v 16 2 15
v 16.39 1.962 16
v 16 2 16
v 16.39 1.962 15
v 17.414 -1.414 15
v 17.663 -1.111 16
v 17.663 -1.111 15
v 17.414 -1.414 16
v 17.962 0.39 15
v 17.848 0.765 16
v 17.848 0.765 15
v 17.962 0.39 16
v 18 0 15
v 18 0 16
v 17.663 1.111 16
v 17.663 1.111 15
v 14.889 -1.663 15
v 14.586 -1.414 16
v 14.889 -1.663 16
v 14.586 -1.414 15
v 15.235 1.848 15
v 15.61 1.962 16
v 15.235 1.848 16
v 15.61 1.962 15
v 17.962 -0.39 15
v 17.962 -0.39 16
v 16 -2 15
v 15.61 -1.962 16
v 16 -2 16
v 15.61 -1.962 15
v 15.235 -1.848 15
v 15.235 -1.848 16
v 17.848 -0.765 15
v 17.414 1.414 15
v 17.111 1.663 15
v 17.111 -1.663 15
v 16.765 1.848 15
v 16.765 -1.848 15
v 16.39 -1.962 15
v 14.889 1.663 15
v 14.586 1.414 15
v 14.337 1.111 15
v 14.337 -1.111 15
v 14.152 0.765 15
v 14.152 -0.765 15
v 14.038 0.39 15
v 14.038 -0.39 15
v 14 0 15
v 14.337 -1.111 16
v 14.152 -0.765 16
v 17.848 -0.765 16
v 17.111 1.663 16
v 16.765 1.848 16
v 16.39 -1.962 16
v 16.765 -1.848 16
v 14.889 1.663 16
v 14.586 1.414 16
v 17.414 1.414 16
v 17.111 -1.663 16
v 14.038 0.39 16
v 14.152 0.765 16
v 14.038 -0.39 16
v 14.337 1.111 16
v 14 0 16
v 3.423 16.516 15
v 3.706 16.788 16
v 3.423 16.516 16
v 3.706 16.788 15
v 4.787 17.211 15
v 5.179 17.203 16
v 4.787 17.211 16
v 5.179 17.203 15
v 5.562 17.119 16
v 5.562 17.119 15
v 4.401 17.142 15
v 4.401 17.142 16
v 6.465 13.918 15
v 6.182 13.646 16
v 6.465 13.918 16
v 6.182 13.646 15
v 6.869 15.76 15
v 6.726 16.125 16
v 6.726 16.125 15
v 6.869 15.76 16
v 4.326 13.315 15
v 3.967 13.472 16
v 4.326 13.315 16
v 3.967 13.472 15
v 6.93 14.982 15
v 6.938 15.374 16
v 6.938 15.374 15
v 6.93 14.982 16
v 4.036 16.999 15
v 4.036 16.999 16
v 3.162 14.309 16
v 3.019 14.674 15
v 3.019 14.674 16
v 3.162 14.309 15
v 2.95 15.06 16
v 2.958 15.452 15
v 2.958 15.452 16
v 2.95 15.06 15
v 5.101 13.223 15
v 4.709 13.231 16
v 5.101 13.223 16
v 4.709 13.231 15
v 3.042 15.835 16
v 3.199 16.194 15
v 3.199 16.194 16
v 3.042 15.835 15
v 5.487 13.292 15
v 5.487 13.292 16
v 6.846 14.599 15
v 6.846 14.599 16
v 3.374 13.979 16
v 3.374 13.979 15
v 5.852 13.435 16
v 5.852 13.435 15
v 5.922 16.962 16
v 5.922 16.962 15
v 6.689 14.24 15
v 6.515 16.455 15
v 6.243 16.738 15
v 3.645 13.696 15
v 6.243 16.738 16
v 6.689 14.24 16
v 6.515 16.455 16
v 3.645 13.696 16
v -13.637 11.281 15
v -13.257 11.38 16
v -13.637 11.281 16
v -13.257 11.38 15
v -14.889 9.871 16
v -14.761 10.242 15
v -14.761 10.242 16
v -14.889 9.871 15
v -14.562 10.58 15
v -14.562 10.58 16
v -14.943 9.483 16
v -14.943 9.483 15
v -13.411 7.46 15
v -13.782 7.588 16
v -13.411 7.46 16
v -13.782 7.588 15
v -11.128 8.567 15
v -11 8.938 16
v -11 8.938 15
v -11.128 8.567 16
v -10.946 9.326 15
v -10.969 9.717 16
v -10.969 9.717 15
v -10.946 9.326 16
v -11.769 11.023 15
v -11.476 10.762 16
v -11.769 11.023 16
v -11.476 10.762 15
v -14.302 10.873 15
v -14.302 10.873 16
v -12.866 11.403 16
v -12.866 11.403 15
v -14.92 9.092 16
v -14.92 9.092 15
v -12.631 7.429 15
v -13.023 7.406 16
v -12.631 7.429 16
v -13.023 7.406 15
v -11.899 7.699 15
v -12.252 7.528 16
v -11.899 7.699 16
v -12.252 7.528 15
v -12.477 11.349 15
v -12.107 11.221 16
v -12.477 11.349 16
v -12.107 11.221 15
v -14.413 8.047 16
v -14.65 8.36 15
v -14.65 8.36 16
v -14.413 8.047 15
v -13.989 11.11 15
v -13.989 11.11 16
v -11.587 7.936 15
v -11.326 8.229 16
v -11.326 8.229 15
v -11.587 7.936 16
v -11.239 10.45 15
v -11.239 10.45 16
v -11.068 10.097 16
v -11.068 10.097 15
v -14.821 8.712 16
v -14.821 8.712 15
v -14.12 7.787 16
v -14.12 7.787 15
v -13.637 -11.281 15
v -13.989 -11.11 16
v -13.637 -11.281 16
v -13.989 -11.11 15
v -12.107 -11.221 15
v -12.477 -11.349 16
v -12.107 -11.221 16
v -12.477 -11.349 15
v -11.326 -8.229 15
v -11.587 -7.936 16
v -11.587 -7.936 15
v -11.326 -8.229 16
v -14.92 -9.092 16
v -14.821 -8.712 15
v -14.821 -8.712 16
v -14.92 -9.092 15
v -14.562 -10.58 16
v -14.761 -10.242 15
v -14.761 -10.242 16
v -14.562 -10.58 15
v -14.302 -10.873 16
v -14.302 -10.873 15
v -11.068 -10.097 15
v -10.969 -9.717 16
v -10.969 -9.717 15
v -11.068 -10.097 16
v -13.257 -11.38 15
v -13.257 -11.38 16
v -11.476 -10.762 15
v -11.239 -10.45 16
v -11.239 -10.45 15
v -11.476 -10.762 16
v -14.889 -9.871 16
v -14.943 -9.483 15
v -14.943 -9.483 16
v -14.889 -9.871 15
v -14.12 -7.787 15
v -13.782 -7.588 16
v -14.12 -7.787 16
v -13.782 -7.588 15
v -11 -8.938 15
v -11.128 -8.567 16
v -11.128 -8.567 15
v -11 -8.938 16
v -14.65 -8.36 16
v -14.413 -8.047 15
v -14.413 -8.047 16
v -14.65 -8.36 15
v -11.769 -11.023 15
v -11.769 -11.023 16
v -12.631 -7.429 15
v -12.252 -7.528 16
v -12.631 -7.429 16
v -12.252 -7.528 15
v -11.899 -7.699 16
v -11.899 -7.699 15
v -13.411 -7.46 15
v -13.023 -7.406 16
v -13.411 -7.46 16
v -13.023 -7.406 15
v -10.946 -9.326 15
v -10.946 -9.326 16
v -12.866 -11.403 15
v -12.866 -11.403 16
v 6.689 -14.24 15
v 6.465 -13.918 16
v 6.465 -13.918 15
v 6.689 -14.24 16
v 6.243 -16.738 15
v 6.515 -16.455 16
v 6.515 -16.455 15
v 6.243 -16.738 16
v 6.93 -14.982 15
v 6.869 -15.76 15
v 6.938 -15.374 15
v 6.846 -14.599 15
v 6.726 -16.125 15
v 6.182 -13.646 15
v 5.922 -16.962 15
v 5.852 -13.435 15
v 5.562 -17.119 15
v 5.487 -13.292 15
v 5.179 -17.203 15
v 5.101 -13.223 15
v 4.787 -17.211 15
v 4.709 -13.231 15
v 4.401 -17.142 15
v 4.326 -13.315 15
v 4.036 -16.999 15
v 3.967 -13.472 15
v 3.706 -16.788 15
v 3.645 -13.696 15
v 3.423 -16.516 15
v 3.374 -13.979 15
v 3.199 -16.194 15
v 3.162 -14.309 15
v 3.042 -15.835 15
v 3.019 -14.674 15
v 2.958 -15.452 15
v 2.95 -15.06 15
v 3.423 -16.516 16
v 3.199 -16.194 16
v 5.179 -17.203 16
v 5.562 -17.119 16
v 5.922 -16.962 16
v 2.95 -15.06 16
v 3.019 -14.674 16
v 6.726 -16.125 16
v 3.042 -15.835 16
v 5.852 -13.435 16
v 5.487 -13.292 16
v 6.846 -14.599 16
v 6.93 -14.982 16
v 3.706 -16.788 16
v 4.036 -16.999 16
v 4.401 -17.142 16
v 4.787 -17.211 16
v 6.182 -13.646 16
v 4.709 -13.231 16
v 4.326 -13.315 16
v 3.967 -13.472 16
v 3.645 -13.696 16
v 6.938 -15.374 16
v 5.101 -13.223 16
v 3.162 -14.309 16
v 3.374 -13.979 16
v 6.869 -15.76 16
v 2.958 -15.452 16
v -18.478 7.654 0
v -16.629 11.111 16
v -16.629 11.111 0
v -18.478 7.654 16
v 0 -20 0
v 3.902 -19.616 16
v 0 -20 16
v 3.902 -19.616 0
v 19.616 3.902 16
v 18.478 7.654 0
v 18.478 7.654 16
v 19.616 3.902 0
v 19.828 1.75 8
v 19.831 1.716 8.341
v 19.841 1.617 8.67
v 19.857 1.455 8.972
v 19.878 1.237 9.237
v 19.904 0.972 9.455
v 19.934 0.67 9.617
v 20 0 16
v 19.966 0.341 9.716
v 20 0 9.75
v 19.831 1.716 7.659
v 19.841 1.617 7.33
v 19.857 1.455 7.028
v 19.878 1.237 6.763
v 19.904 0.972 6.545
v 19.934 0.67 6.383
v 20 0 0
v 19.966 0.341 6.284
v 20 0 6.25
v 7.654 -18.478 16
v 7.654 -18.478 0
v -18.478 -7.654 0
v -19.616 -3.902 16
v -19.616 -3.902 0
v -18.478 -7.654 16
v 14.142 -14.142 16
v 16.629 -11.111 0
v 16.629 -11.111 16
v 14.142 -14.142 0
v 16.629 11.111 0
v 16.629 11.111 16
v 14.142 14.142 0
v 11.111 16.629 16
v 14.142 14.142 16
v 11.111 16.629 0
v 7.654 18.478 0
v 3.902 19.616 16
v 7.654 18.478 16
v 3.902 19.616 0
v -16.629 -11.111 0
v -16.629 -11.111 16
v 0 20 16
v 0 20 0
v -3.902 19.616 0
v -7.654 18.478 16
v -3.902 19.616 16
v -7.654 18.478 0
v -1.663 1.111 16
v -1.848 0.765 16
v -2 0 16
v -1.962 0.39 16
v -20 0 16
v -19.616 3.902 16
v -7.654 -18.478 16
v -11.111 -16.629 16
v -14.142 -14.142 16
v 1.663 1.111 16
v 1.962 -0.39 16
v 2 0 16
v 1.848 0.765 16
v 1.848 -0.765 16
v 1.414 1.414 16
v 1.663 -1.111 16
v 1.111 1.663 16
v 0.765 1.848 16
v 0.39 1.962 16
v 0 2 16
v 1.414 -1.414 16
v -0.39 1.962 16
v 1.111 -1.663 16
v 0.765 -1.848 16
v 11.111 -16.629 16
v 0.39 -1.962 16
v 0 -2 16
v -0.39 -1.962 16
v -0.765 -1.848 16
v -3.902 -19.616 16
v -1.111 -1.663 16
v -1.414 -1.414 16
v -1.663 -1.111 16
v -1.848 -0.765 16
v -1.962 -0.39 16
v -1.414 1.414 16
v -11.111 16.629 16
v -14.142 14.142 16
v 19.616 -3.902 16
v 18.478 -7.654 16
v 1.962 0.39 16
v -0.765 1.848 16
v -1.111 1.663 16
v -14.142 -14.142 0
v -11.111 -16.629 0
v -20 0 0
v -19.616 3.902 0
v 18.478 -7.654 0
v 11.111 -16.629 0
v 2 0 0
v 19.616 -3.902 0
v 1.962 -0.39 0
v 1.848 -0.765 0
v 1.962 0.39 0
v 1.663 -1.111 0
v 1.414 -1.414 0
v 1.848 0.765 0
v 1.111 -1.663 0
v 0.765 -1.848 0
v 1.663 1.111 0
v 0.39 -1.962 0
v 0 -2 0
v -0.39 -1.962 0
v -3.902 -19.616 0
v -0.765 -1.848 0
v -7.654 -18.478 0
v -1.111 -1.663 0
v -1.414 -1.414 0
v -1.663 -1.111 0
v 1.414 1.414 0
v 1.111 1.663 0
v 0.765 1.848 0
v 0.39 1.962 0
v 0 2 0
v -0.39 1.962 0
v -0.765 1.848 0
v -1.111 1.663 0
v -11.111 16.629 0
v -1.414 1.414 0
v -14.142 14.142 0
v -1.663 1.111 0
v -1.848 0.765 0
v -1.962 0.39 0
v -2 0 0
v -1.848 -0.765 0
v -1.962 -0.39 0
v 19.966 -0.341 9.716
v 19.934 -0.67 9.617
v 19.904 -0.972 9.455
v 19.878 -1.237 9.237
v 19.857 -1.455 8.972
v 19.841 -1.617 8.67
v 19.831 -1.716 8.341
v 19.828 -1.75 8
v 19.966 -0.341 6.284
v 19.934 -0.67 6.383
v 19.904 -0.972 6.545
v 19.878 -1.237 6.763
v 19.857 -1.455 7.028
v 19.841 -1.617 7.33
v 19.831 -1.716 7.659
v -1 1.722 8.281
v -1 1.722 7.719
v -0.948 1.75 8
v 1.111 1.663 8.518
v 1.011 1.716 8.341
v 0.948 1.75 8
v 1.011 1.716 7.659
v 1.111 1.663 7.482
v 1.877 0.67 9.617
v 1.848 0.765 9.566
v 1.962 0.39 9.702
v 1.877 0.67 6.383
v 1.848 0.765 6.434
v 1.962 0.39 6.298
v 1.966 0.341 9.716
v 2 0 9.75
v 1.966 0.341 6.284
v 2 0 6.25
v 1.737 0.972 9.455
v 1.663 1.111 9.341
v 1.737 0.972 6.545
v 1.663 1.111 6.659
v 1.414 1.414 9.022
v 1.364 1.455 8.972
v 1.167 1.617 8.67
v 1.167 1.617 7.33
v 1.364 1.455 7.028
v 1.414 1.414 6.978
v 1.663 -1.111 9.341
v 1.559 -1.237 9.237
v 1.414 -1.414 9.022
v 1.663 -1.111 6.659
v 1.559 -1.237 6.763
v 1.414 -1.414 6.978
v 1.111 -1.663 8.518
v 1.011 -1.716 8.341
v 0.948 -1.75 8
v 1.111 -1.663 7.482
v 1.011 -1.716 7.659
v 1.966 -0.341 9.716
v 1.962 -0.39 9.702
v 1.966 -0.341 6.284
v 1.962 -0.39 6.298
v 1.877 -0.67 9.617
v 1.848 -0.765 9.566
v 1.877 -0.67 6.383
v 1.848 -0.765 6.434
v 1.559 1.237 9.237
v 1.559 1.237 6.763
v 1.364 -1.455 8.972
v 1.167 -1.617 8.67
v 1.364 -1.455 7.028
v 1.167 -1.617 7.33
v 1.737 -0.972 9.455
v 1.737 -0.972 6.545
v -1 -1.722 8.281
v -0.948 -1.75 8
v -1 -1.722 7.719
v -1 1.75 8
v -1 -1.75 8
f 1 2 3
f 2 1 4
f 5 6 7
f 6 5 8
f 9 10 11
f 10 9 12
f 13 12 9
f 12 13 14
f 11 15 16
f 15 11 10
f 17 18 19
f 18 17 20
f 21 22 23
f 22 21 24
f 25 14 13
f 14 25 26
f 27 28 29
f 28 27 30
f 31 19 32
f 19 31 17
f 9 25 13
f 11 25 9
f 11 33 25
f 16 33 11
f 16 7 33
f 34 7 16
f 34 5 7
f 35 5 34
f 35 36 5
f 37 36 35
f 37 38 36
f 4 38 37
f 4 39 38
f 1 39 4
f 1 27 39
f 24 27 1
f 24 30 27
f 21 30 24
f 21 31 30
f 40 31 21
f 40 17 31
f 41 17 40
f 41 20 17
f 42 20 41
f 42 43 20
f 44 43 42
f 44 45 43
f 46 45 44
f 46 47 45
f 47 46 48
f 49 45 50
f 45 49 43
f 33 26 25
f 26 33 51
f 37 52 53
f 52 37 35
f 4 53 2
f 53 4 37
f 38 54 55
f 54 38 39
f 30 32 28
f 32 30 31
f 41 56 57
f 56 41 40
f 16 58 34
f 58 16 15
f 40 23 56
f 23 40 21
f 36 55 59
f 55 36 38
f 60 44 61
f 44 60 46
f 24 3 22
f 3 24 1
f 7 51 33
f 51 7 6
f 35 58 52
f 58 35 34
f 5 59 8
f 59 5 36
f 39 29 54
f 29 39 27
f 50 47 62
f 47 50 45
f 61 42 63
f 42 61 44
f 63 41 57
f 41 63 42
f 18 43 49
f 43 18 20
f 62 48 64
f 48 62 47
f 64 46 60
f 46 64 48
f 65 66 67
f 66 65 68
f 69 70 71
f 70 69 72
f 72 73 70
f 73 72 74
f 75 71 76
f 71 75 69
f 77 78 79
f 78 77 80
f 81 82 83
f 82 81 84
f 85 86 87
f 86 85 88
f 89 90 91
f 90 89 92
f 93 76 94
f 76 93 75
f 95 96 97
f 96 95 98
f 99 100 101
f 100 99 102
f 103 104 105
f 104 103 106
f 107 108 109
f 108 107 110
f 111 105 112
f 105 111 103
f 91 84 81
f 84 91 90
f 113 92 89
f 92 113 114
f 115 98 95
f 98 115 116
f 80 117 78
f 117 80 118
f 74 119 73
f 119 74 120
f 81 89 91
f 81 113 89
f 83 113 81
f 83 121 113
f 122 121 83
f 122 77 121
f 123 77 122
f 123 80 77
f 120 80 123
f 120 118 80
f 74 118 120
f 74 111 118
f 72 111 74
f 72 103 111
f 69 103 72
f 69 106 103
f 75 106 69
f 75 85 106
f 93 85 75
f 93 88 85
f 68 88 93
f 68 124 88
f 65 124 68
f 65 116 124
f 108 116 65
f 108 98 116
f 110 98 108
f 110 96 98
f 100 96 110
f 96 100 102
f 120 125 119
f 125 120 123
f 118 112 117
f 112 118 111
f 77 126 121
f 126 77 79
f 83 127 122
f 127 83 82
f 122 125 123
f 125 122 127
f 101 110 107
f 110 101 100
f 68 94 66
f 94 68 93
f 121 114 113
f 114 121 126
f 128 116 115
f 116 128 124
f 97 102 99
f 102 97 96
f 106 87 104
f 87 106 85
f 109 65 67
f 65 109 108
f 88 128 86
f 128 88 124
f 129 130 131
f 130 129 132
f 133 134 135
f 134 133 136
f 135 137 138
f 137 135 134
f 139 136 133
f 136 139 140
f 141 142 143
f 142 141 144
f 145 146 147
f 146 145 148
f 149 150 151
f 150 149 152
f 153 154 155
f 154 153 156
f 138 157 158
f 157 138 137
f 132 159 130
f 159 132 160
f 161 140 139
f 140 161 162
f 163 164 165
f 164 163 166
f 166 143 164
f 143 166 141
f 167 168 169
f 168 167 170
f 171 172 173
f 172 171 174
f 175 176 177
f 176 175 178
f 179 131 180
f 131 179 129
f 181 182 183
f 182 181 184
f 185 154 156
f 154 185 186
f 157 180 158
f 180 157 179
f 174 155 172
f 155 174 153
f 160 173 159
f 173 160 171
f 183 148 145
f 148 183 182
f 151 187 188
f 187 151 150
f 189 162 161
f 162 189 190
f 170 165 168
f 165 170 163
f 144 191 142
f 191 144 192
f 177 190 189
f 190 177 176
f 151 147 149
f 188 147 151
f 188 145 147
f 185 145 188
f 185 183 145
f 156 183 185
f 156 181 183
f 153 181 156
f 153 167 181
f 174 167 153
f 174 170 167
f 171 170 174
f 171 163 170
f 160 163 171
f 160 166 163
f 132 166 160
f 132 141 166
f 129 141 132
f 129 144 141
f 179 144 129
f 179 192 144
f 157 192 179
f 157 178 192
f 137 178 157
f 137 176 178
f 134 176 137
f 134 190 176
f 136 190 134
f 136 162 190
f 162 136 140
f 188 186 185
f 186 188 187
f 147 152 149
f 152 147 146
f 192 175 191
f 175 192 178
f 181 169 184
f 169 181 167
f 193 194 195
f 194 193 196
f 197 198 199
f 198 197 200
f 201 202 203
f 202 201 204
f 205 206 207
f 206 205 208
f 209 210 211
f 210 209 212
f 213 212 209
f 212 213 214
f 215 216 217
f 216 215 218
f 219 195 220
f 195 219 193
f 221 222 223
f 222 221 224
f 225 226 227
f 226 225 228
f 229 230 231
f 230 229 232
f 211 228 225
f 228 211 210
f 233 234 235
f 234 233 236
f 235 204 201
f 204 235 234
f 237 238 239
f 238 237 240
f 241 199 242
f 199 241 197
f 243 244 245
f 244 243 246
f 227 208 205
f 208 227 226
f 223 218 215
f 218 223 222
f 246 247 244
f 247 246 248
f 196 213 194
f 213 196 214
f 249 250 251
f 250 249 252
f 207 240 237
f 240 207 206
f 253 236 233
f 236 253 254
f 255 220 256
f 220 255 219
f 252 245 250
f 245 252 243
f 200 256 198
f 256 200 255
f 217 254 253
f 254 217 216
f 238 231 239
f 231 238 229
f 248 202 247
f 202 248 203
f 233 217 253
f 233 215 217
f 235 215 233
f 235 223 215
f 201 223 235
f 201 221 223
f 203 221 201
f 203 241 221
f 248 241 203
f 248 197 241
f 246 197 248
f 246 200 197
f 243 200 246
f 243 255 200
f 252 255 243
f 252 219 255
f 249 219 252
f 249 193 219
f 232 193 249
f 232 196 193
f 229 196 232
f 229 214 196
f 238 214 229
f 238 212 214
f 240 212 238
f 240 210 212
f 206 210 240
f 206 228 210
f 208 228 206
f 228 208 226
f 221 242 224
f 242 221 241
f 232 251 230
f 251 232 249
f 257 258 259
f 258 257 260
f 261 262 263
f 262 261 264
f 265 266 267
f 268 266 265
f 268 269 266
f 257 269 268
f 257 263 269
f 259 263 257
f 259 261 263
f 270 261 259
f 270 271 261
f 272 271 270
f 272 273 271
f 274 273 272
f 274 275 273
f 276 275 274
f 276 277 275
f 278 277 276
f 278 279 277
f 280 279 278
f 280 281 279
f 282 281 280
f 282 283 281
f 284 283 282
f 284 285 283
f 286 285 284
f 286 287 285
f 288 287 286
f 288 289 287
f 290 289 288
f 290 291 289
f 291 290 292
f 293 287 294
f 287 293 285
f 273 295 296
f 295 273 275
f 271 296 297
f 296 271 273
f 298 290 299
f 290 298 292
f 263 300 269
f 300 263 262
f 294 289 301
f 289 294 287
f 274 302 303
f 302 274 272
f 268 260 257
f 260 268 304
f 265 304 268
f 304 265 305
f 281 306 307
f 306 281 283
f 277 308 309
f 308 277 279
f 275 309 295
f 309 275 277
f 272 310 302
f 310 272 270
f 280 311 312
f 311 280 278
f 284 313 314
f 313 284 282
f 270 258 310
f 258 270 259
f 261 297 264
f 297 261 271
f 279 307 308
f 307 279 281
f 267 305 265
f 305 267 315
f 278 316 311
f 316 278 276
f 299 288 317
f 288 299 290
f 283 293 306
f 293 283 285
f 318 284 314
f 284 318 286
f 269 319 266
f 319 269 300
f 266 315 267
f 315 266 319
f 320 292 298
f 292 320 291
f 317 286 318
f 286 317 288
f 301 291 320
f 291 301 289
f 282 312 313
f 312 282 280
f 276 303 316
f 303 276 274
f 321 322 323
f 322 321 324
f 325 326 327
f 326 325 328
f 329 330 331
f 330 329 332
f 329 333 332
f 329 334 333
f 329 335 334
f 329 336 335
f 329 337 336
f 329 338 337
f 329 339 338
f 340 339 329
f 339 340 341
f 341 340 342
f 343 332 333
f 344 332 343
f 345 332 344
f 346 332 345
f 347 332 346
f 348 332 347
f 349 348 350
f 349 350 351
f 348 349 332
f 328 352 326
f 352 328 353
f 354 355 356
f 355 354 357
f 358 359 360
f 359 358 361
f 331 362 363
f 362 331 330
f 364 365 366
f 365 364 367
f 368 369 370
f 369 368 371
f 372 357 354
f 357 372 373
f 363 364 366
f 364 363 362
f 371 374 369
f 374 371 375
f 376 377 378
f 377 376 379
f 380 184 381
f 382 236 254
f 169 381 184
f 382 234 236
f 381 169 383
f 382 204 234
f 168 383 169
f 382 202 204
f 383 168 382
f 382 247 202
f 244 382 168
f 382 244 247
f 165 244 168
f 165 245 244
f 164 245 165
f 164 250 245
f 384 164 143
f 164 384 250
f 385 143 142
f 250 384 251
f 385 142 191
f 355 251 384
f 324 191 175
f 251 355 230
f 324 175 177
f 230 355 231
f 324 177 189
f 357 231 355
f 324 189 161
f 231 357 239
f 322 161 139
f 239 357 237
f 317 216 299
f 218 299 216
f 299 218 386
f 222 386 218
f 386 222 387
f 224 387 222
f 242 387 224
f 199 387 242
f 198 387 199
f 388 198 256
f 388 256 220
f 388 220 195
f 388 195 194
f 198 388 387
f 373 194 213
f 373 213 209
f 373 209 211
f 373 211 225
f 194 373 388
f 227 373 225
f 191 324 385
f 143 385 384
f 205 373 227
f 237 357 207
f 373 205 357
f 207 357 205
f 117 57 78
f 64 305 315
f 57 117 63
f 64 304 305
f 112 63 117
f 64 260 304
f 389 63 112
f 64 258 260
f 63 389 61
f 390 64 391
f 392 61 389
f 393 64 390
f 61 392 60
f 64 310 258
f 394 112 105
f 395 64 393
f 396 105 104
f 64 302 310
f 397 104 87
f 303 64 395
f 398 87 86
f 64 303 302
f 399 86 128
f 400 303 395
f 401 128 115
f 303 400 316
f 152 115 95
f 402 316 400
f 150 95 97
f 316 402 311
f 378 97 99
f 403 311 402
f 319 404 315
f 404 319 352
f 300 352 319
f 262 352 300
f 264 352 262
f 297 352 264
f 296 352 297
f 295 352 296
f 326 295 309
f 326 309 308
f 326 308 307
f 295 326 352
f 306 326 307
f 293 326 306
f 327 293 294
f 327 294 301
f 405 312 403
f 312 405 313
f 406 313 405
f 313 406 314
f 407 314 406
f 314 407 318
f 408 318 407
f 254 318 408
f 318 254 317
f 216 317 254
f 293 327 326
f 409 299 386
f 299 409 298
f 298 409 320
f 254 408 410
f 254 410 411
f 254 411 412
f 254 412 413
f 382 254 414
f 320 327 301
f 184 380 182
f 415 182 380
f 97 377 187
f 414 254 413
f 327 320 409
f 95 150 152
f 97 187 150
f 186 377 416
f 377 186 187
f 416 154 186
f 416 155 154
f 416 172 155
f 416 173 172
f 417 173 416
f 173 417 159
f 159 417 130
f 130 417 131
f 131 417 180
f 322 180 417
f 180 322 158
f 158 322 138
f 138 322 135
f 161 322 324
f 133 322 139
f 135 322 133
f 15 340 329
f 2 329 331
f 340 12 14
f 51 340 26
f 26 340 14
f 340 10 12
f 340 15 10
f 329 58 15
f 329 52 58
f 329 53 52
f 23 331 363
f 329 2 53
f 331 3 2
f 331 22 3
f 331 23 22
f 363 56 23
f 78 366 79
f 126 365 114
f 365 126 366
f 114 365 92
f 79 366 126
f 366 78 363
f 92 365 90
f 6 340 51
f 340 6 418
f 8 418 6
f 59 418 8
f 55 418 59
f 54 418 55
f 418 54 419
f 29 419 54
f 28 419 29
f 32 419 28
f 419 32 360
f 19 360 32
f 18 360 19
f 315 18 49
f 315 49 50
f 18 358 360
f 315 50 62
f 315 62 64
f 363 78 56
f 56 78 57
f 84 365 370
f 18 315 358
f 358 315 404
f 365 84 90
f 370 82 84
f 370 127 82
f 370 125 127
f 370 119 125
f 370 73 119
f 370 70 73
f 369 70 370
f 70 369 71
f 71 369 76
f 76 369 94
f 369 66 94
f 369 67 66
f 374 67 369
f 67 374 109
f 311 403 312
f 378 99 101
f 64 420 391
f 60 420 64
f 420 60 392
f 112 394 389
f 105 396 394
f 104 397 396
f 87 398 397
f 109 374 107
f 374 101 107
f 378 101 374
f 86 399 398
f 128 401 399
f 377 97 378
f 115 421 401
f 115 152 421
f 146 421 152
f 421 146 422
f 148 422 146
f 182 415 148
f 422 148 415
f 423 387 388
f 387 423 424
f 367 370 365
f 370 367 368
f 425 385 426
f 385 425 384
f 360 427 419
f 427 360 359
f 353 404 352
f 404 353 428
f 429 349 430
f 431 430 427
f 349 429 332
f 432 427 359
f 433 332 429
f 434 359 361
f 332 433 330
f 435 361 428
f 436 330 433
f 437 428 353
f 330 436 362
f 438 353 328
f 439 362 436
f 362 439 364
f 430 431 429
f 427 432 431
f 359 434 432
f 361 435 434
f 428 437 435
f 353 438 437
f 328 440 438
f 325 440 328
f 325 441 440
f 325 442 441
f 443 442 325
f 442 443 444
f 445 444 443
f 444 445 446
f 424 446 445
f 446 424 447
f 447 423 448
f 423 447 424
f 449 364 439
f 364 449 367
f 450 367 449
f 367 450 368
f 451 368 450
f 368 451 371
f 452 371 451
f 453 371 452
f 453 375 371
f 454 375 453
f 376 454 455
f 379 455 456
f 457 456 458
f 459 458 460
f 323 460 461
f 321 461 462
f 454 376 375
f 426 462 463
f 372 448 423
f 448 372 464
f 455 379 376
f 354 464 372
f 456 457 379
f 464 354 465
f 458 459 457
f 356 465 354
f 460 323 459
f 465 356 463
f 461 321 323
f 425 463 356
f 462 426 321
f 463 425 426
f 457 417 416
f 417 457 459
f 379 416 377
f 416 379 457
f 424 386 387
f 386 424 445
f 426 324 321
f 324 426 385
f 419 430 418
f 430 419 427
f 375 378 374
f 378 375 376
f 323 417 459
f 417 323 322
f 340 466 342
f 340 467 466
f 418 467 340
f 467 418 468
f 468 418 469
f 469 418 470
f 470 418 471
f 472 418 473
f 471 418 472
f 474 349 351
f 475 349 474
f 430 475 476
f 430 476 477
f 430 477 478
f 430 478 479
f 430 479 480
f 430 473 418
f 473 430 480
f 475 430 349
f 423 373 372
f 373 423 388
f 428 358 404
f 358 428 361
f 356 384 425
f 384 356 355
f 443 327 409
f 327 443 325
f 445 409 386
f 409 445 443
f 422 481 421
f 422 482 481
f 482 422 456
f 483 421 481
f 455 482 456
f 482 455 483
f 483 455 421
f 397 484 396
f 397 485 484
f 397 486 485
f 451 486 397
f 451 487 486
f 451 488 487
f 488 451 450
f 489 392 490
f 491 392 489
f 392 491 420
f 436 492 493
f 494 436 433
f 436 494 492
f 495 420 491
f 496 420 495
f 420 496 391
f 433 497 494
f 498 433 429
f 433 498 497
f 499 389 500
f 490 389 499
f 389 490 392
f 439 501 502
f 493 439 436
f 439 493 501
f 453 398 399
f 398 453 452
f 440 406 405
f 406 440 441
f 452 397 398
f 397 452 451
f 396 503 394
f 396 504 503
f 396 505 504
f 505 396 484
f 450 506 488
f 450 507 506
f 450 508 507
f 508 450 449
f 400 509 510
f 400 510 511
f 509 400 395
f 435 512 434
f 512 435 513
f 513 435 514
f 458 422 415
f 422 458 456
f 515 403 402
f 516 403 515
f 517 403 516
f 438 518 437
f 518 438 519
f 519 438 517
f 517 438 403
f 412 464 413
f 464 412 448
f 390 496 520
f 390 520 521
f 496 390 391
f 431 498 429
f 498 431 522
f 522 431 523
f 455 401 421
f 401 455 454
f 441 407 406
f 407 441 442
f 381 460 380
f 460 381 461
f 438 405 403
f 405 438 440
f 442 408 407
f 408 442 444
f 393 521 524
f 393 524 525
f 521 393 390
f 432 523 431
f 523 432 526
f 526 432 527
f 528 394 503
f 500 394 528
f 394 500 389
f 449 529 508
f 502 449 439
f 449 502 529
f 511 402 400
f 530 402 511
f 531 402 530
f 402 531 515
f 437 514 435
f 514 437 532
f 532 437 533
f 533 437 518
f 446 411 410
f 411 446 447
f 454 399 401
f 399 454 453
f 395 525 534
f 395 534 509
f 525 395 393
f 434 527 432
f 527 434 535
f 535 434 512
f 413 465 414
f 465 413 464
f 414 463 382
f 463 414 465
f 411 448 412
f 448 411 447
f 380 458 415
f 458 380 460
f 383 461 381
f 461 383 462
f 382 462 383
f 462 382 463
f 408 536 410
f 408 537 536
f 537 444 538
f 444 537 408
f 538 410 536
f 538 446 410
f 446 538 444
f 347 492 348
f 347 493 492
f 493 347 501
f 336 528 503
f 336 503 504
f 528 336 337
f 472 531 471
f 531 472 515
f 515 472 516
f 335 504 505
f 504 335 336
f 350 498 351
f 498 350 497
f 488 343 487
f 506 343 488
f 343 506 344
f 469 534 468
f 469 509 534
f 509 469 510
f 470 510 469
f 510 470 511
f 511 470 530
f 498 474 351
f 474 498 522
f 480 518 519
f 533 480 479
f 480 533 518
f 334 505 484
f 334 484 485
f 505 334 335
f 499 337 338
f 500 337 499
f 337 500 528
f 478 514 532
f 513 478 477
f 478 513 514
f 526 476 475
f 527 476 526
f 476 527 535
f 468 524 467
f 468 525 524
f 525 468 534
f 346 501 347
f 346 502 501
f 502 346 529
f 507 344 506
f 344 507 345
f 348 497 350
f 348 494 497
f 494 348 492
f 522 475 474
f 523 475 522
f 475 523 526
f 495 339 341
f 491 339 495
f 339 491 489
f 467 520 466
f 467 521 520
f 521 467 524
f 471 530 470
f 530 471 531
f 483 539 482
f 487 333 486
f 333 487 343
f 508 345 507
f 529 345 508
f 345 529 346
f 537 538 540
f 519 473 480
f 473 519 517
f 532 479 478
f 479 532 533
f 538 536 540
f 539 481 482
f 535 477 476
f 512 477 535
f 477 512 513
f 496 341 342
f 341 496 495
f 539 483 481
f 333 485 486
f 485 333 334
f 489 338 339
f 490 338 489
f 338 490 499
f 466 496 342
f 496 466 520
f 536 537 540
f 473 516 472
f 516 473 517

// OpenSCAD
$fn = 32;

// ----------------------------------------------------------------------
// Control knob: dimpled knob
// ----------------------------------------------------------------------

// --- parameters (mm) ---
dimp_d = 4;               // finger dimple diameter
n_dimp = 5;               // number of dimples
dimp_r = 16;              // dimple ring radius
knob_d = 40;              // knob body diameter
knob_h = 16;              // knob body height
bore_d = 4;               // shaft bore diameter
set_d = 3.5;              // set screw bore diameter

dimp_step = 360 / n_dimp;  // dimple angular step

difference() {
  cylinder(h = knob_h, d = knob_d);
  translate([0, 0, -1]) cylinder(h = knob_h + 2, d = bore_d);
  translate([-1, 0, knob_h / 2]) rotate([0, 90, 0])
    cylinder(h = knob_d / 2 + bore_d / 2 + 2, d = set_d);  for (i = [0 : n_dimp - 1])
    rotate([0, 0, i * dimp_step])
      translate([dimp_r, 0, knob_h - 1])
        cylinder(h = 2, d = dimp_d);
}
